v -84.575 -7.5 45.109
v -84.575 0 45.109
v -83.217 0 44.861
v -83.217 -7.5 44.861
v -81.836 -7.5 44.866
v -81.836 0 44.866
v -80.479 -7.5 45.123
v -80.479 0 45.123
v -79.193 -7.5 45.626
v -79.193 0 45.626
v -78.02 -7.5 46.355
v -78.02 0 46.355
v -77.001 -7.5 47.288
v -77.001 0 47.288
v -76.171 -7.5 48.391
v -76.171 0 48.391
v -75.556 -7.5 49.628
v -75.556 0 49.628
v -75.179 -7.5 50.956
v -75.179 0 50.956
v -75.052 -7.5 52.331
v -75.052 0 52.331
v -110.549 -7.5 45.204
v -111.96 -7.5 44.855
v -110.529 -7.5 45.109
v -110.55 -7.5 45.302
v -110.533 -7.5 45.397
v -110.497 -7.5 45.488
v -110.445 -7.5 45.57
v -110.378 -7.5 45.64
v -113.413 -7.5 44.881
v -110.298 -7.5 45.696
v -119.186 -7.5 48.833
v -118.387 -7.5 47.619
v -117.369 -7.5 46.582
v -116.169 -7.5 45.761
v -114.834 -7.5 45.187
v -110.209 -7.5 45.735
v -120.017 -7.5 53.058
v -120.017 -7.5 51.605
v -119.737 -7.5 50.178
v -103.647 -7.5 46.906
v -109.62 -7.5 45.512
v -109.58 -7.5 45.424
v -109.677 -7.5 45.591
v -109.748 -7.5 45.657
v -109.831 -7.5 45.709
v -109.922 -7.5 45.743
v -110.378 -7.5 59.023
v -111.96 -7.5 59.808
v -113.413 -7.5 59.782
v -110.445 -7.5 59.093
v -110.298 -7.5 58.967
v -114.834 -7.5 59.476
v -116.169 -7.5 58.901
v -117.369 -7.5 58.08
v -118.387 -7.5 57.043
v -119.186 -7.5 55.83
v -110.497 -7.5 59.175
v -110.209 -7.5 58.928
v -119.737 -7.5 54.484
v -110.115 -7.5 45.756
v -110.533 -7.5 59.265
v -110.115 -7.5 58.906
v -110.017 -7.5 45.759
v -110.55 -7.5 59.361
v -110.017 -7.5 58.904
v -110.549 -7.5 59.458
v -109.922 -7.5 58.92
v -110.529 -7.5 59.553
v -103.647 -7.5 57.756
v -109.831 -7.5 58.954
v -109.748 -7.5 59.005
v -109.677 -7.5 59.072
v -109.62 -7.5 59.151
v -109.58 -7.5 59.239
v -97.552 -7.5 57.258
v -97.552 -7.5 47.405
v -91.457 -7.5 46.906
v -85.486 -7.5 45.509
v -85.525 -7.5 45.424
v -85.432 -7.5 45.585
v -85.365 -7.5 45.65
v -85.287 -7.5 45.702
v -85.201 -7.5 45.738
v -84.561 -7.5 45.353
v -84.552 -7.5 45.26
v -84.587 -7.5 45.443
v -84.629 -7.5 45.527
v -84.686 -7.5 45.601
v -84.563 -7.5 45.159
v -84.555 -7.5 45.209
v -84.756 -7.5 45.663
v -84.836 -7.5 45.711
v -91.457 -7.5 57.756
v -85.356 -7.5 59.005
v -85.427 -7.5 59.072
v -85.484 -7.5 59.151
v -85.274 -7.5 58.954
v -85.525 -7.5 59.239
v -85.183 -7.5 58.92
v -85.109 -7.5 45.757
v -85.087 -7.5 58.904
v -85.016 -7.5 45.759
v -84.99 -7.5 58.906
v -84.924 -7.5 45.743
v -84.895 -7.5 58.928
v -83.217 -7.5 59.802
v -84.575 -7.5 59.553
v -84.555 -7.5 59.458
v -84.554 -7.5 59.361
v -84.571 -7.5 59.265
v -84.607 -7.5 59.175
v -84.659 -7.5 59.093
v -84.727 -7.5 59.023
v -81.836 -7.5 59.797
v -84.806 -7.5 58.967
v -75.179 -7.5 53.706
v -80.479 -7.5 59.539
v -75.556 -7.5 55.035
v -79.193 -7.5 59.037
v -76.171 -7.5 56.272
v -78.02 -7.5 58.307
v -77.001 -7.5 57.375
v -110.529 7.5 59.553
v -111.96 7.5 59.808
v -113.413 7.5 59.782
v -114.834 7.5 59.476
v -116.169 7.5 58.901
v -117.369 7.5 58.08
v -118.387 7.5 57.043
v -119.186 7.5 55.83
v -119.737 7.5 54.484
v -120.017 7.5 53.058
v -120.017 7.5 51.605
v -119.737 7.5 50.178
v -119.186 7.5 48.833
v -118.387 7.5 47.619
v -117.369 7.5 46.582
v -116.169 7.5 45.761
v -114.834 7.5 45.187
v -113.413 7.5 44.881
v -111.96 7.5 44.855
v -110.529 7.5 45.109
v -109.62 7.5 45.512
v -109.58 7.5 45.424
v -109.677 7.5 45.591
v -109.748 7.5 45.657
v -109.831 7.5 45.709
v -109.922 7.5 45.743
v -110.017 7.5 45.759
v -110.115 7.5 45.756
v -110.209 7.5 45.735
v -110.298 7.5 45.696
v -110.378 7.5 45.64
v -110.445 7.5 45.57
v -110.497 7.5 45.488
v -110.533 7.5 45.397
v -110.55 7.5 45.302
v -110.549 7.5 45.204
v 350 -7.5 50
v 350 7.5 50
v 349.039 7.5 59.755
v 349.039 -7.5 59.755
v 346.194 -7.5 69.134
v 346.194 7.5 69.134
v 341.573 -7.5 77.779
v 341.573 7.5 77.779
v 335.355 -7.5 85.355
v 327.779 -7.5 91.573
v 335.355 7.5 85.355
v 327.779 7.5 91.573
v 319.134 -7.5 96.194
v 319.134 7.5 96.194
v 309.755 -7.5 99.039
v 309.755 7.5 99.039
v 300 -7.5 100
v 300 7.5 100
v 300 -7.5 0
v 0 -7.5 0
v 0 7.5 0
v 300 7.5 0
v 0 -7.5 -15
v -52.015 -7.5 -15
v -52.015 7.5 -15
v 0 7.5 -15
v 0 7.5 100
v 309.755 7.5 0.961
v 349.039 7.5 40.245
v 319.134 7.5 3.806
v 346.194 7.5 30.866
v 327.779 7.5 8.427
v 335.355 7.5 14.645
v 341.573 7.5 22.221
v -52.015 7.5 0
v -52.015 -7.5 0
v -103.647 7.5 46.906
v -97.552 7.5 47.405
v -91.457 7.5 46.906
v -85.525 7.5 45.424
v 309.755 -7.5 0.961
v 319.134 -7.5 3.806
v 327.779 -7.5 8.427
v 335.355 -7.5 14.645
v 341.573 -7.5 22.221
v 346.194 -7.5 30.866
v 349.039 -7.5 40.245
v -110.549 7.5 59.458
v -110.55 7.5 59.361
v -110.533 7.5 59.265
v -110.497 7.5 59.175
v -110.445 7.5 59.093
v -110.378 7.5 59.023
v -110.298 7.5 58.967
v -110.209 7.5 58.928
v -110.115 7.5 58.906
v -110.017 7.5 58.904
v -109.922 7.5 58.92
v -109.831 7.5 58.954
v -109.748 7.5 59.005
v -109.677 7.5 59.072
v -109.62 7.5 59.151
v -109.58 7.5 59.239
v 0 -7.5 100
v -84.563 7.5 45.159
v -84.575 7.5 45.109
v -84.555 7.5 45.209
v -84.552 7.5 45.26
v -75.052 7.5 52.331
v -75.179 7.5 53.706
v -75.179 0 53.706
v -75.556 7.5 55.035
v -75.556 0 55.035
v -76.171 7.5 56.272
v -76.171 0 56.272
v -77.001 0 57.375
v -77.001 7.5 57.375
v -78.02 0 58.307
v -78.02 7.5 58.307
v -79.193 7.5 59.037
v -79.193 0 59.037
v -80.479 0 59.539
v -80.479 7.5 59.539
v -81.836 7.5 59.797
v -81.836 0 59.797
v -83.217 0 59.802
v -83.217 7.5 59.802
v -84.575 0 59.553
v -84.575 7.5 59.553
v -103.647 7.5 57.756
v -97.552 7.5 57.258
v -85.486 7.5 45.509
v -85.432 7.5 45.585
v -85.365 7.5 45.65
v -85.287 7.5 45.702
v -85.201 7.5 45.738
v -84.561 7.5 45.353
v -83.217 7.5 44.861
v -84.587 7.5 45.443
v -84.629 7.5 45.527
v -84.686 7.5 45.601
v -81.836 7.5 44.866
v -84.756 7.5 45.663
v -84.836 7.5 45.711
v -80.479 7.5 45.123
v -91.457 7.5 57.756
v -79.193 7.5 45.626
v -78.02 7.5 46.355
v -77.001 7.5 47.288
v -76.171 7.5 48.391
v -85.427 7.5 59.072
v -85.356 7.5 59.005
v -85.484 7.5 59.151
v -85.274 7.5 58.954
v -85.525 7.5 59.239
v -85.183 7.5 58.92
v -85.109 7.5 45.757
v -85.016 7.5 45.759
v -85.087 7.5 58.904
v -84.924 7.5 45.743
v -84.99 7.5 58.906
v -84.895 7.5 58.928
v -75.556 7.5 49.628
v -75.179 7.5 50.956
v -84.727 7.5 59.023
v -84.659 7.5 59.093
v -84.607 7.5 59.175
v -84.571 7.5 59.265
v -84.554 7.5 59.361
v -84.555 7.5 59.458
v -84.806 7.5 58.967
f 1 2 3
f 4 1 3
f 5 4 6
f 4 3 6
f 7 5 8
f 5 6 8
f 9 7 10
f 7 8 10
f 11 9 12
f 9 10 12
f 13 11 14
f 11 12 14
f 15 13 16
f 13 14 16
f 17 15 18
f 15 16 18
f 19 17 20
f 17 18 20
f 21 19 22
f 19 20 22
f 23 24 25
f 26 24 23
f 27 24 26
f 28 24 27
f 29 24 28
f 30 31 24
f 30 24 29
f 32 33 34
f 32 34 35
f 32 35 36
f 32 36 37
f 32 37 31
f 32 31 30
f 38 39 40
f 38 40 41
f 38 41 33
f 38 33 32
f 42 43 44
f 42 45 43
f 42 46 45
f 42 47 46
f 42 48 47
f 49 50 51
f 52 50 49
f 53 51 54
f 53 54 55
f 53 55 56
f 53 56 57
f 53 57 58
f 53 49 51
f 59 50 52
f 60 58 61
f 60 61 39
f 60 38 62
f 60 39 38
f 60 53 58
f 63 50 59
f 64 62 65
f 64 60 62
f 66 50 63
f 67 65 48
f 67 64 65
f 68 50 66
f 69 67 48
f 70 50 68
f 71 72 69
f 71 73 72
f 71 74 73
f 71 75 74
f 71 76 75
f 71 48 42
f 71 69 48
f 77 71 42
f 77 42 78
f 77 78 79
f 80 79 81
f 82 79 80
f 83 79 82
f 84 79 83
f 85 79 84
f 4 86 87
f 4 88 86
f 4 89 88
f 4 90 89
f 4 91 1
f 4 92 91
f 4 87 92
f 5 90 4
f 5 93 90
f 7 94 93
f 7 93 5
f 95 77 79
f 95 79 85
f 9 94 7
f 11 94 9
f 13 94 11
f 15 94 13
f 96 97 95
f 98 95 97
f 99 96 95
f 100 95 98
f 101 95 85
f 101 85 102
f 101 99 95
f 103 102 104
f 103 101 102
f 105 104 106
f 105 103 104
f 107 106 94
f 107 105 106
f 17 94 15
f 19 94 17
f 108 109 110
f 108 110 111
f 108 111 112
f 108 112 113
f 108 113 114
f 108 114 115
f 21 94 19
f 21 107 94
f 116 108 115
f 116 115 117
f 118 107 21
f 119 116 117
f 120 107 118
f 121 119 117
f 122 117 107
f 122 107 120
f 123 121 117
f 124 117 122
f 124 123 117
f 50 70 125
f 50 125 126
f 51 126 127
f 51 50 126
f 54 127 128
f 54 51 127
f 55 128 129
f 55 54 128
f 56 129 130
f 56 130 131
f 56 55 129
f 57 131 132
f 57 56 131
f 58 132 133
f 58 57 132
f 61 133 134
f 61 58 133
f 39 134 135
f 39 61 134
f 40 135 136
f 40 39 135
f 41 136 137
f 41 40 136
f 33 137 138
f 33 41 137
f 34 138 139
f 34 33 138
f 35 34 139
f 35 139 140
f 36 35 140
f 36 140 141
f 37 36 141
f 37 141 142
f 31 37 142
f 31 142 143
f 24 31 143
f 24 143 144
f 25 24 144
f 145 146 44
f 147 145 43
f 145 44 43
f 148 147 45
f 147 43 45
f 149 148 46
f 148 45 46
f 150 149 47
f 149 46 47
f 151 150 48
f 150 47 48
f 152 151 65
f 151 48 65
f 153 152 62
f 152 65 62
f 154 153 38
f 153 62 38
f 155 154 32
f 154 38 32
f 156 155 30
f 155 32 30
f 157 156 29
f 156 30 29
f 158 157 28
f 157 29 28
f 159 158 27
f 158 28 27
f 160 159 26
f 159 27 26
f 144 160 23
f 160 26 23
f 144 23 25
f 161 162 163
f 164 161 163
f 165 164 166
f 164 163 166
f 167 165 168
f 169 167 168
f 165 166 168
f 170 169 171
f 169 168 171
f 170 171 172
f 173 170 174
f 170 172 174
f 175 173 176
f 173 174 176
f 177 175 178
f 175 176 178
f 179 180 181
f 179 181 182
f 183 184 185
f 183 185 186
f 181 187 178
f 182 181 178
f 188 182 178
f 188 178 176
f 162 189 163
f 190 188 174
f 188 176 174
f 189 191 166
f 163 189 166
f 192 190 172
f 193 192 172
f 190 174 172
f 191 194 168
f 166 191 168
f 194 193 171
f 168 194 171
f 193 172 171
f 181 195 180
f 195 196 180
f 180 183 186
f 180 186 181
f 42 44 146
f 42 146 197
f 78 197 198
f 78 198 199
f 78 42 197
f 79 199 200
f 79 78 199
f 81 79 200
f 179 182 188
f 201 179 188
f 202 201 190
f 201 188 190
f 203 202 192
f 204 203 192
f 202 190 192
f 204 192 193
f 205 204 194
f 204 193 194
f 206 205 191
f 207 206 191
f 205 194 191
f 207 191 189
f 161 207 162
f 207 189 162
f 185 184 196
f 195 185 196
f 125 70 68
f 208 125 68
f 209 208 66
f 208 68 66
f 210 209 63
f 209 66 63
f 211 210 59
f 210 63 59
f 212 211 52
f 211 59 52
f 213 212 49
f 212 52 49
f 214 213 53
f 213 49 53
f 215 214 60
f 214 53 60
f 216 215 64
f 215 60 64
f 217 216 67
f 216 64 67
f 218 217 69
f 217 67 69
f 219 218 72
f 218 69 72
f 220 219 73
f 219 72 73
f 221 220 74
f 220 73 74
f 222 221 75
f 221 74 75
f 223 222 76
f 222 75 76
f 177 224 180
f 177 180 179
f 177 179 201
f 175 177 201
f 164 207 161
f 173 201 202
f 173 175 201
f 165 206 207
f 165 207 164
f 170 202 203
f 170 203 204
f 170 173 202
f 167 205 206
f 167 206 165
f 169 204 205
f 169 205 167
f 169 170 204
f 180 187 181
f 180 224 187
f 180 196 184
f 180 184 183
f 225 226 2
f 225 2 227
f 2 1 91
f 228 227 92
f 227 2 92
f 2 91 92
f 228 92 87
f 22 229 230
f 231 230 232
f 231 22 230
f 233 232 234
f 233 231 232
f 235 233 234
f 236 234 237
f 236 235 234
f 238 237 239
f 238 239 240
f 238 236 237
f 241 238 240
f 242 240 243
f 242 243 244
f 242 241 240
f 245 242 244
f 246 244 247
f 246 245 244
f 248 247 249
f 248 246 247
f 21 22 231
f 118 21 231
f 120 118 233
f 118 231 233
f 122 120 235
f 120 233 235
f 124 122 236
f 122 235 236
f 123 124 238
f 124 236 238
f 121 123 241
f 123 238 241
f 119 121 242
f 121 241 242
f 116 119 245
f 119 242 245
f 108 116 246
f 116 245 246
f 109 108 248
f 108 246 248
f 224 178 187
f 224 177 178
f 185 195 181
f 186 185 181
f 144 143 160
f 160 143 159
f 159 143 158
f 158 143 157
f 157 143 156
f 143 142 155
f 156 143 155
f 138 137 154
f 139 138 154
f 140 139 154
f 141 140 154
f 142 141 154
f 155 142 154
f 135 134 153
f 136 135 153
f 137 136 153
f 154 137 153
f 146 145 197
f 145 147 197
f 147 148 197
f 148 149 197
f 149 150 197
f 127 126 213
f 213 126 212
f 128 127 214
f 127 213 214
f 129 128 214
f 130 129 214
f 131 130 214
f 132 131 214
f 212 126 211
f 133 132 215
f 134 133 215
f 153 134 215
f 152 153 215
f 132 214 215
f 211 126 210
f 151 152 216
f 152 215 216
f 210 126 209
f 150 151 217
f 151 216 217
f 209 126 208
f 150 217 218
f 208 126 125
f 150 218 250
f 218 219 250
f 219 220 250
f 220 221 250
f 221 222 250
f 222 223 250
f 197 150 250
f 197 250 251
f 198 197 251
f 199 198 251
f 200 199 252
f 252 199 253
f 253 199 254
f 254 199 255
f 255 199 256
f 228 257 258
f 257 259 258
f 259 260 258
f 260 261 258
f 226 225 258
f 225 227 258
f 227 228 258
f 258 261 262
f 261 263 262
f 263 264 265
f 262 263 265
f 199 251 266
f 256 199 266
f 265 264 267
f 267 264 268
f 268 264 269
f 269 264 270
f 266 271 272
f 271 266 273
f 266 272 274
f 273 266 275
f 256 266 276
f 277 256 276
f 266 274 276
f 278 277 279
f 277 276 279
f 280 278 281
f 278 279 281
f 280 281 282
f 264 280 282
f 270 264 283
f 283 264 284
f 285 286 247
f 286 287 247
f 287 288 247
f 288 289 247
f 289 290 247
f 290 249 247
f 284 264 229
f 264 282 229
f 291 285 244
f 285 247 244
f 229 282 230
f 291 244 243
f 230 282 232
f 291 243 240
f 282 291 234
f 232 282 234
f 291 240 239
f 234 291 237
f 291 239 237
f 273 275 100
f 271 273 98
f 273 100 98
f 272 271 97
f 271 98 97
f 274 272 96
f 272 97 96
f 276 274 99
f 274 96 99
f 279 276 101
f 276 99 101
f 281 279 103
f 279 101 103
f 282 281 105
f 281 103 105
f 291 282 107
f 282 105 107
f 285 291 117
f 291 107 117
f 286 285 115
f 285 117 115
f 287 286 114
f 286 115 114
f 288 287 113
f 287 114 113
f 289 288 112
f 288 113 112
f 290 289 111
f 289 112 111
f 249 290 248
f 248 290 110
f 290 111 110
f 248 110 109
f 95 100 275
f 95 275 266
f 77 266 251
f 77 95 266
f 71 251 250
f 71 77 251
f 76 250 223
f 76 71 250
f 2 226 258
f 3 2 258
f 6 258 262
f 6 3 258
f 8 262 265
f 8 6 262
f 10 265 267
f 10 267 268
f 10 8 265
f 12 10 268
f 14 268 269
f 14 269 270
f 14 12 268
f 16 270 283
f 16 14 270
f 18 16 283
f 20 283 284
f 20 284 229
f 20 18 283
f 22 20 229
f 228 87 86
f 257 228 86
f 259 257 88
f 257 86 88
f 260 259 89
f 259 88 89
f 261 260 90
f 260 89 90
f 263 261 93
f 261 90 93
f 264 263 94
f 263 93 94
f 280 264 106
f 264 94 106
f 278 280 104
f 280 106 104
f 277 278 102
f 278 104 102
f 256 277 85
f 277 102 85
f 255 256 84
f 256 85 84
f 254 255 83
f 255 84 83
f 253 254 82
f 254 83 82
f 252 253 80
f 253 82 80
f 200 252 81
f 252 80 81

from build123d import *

# Parameters (mm, degrees)
F2_DEPTH = 7.5
F3_W     = 52.0147429434
F3_H     = 15
F4_DEPTH = 7.5
F6_DEPTH = 7.5
F7_R     = 0.5
F8_DEPTH = 25


with BuildPart() as f2:
    # F1 (on Front) → F2 (new body, symmetric)
    with BuildSketch(Plane.XZ):
        with BuildLine():
            Line((0, 100), (0, 0))
            Line((0, 0), (300, 0))
            ThreePointArc((300, 0), (250, 50), (300, 100))
            Line((300, 100), (0, 100))
        make_face()
        with BuildLine():
            ThreePointArc((300, 100), (250, 50), (300, 0))
            Line((300, 0), (300, 100))
        make_face()
        with BuildLine():
            Line((300, 100), (300, 0))
            ThreePointArc((300, 0), (335.3553390593, 14.6446609407), (350, 50))
            ThreePointArc((350, 50), (335.3553390593, 85.3553390593), (300, 100))
        make_face()
    extrude(amount=F2_DEPTH, both=True)


with BuildPart() as f4:
    # F3 (on Front) → F4 (new body, symmetric)
    with BuildSketch(Plane.XZ):
        with Locations((-26.0073714717, -7.5)):
            Rectangle(F3_W, F3_H)
    extrude(amount=F4_DEPTH, both=True)


with BuildPart() as f6:
    # F5 (on Front) → F6 (new body, symmetric)
    with BuildSketch(Plane.XZ):
        with BuildLine():
            ThreePointArc((-110.0521796982, 45.2602605215), (-106.4284552261, 48.0012013012), (-105.0521795322, 52.331328392))
            ThreePointArc((-105.0521795322, 52.331328392), (-106.4284552185, 56.6614554721), (-110.0521796734, 59.4023962538))
            ThreePointArc((-110.0521796734, 59.4023962538), (-120.0521795322, 52.3313284051), (-110.0521796982, 45.2602605215))
        make_face()
        with BuildLine():
            ThreePointArc((-110.0521796734, 59.4023962538), (-106.4284552185, 56.6614554721), (-105.0521795322, 52.331328392))
            ThreePointArc((-105.0521795322, 52.331328392), (-106.4284552261, 48.0012013012), (-110.0521796982, 45.2602605215))
            ThreePointArc((-110.0521796982, 45.2602605215), (-97.5521795322, 47.4049215208), (-85.0521793663, 45.2602605215))
            ThreePointArc((-85.0521793663, 45.2602605215), (-90.0521795322, 52.3313284476), (-85.0521792615, 59.4023962996))
            ThreePointArc((-85.0521792615, 59.4023962996), (-97.5521794635, 57.2577352632), (-110.0521796734, 59.4023962538))
        make_face()
        with BuildLine():
            ThreePointArc((-75.0521795322, 52.331328392), (-78.2220523961, 58.4550526661), (-85.0521792615, 59.4023962996))
            ThreePointArc((-85.0521792615, 59.4023962996), (-90.0521795322, 52.3313284476), (-85.0521793663, 45.2602605215))
            ThreePointArc((-85.0521793663, 45.2602605215), (-78.2220524414, 46.2076040859), (-75.0521795322, 52.331328392))
        make_face()
    extrude(amount=F6_DEPTH, both=True)

    # F7 (on face) → F8 (cut)
    with BuildSketch(Plane.XZ.offset(7.5)):
        with Locations((-110.0521795322, 59.4023962039)):
            Circle(F7_R)
        with Locations((-85.0521795322, 59.4023962039)):
            Circle(F7_R)
        with Locations((-85.0521795322, 45.2602605802)):
            Circle(F7_R)
        with Locations((-110.0521795322, 45.2602605802)):
            Circle(F7_R)
    extrude(amount=-F8_DEPTH, mode=Mode.SUBTRACT)


solid = Compound([f2.part, f4.part, f6.part])
